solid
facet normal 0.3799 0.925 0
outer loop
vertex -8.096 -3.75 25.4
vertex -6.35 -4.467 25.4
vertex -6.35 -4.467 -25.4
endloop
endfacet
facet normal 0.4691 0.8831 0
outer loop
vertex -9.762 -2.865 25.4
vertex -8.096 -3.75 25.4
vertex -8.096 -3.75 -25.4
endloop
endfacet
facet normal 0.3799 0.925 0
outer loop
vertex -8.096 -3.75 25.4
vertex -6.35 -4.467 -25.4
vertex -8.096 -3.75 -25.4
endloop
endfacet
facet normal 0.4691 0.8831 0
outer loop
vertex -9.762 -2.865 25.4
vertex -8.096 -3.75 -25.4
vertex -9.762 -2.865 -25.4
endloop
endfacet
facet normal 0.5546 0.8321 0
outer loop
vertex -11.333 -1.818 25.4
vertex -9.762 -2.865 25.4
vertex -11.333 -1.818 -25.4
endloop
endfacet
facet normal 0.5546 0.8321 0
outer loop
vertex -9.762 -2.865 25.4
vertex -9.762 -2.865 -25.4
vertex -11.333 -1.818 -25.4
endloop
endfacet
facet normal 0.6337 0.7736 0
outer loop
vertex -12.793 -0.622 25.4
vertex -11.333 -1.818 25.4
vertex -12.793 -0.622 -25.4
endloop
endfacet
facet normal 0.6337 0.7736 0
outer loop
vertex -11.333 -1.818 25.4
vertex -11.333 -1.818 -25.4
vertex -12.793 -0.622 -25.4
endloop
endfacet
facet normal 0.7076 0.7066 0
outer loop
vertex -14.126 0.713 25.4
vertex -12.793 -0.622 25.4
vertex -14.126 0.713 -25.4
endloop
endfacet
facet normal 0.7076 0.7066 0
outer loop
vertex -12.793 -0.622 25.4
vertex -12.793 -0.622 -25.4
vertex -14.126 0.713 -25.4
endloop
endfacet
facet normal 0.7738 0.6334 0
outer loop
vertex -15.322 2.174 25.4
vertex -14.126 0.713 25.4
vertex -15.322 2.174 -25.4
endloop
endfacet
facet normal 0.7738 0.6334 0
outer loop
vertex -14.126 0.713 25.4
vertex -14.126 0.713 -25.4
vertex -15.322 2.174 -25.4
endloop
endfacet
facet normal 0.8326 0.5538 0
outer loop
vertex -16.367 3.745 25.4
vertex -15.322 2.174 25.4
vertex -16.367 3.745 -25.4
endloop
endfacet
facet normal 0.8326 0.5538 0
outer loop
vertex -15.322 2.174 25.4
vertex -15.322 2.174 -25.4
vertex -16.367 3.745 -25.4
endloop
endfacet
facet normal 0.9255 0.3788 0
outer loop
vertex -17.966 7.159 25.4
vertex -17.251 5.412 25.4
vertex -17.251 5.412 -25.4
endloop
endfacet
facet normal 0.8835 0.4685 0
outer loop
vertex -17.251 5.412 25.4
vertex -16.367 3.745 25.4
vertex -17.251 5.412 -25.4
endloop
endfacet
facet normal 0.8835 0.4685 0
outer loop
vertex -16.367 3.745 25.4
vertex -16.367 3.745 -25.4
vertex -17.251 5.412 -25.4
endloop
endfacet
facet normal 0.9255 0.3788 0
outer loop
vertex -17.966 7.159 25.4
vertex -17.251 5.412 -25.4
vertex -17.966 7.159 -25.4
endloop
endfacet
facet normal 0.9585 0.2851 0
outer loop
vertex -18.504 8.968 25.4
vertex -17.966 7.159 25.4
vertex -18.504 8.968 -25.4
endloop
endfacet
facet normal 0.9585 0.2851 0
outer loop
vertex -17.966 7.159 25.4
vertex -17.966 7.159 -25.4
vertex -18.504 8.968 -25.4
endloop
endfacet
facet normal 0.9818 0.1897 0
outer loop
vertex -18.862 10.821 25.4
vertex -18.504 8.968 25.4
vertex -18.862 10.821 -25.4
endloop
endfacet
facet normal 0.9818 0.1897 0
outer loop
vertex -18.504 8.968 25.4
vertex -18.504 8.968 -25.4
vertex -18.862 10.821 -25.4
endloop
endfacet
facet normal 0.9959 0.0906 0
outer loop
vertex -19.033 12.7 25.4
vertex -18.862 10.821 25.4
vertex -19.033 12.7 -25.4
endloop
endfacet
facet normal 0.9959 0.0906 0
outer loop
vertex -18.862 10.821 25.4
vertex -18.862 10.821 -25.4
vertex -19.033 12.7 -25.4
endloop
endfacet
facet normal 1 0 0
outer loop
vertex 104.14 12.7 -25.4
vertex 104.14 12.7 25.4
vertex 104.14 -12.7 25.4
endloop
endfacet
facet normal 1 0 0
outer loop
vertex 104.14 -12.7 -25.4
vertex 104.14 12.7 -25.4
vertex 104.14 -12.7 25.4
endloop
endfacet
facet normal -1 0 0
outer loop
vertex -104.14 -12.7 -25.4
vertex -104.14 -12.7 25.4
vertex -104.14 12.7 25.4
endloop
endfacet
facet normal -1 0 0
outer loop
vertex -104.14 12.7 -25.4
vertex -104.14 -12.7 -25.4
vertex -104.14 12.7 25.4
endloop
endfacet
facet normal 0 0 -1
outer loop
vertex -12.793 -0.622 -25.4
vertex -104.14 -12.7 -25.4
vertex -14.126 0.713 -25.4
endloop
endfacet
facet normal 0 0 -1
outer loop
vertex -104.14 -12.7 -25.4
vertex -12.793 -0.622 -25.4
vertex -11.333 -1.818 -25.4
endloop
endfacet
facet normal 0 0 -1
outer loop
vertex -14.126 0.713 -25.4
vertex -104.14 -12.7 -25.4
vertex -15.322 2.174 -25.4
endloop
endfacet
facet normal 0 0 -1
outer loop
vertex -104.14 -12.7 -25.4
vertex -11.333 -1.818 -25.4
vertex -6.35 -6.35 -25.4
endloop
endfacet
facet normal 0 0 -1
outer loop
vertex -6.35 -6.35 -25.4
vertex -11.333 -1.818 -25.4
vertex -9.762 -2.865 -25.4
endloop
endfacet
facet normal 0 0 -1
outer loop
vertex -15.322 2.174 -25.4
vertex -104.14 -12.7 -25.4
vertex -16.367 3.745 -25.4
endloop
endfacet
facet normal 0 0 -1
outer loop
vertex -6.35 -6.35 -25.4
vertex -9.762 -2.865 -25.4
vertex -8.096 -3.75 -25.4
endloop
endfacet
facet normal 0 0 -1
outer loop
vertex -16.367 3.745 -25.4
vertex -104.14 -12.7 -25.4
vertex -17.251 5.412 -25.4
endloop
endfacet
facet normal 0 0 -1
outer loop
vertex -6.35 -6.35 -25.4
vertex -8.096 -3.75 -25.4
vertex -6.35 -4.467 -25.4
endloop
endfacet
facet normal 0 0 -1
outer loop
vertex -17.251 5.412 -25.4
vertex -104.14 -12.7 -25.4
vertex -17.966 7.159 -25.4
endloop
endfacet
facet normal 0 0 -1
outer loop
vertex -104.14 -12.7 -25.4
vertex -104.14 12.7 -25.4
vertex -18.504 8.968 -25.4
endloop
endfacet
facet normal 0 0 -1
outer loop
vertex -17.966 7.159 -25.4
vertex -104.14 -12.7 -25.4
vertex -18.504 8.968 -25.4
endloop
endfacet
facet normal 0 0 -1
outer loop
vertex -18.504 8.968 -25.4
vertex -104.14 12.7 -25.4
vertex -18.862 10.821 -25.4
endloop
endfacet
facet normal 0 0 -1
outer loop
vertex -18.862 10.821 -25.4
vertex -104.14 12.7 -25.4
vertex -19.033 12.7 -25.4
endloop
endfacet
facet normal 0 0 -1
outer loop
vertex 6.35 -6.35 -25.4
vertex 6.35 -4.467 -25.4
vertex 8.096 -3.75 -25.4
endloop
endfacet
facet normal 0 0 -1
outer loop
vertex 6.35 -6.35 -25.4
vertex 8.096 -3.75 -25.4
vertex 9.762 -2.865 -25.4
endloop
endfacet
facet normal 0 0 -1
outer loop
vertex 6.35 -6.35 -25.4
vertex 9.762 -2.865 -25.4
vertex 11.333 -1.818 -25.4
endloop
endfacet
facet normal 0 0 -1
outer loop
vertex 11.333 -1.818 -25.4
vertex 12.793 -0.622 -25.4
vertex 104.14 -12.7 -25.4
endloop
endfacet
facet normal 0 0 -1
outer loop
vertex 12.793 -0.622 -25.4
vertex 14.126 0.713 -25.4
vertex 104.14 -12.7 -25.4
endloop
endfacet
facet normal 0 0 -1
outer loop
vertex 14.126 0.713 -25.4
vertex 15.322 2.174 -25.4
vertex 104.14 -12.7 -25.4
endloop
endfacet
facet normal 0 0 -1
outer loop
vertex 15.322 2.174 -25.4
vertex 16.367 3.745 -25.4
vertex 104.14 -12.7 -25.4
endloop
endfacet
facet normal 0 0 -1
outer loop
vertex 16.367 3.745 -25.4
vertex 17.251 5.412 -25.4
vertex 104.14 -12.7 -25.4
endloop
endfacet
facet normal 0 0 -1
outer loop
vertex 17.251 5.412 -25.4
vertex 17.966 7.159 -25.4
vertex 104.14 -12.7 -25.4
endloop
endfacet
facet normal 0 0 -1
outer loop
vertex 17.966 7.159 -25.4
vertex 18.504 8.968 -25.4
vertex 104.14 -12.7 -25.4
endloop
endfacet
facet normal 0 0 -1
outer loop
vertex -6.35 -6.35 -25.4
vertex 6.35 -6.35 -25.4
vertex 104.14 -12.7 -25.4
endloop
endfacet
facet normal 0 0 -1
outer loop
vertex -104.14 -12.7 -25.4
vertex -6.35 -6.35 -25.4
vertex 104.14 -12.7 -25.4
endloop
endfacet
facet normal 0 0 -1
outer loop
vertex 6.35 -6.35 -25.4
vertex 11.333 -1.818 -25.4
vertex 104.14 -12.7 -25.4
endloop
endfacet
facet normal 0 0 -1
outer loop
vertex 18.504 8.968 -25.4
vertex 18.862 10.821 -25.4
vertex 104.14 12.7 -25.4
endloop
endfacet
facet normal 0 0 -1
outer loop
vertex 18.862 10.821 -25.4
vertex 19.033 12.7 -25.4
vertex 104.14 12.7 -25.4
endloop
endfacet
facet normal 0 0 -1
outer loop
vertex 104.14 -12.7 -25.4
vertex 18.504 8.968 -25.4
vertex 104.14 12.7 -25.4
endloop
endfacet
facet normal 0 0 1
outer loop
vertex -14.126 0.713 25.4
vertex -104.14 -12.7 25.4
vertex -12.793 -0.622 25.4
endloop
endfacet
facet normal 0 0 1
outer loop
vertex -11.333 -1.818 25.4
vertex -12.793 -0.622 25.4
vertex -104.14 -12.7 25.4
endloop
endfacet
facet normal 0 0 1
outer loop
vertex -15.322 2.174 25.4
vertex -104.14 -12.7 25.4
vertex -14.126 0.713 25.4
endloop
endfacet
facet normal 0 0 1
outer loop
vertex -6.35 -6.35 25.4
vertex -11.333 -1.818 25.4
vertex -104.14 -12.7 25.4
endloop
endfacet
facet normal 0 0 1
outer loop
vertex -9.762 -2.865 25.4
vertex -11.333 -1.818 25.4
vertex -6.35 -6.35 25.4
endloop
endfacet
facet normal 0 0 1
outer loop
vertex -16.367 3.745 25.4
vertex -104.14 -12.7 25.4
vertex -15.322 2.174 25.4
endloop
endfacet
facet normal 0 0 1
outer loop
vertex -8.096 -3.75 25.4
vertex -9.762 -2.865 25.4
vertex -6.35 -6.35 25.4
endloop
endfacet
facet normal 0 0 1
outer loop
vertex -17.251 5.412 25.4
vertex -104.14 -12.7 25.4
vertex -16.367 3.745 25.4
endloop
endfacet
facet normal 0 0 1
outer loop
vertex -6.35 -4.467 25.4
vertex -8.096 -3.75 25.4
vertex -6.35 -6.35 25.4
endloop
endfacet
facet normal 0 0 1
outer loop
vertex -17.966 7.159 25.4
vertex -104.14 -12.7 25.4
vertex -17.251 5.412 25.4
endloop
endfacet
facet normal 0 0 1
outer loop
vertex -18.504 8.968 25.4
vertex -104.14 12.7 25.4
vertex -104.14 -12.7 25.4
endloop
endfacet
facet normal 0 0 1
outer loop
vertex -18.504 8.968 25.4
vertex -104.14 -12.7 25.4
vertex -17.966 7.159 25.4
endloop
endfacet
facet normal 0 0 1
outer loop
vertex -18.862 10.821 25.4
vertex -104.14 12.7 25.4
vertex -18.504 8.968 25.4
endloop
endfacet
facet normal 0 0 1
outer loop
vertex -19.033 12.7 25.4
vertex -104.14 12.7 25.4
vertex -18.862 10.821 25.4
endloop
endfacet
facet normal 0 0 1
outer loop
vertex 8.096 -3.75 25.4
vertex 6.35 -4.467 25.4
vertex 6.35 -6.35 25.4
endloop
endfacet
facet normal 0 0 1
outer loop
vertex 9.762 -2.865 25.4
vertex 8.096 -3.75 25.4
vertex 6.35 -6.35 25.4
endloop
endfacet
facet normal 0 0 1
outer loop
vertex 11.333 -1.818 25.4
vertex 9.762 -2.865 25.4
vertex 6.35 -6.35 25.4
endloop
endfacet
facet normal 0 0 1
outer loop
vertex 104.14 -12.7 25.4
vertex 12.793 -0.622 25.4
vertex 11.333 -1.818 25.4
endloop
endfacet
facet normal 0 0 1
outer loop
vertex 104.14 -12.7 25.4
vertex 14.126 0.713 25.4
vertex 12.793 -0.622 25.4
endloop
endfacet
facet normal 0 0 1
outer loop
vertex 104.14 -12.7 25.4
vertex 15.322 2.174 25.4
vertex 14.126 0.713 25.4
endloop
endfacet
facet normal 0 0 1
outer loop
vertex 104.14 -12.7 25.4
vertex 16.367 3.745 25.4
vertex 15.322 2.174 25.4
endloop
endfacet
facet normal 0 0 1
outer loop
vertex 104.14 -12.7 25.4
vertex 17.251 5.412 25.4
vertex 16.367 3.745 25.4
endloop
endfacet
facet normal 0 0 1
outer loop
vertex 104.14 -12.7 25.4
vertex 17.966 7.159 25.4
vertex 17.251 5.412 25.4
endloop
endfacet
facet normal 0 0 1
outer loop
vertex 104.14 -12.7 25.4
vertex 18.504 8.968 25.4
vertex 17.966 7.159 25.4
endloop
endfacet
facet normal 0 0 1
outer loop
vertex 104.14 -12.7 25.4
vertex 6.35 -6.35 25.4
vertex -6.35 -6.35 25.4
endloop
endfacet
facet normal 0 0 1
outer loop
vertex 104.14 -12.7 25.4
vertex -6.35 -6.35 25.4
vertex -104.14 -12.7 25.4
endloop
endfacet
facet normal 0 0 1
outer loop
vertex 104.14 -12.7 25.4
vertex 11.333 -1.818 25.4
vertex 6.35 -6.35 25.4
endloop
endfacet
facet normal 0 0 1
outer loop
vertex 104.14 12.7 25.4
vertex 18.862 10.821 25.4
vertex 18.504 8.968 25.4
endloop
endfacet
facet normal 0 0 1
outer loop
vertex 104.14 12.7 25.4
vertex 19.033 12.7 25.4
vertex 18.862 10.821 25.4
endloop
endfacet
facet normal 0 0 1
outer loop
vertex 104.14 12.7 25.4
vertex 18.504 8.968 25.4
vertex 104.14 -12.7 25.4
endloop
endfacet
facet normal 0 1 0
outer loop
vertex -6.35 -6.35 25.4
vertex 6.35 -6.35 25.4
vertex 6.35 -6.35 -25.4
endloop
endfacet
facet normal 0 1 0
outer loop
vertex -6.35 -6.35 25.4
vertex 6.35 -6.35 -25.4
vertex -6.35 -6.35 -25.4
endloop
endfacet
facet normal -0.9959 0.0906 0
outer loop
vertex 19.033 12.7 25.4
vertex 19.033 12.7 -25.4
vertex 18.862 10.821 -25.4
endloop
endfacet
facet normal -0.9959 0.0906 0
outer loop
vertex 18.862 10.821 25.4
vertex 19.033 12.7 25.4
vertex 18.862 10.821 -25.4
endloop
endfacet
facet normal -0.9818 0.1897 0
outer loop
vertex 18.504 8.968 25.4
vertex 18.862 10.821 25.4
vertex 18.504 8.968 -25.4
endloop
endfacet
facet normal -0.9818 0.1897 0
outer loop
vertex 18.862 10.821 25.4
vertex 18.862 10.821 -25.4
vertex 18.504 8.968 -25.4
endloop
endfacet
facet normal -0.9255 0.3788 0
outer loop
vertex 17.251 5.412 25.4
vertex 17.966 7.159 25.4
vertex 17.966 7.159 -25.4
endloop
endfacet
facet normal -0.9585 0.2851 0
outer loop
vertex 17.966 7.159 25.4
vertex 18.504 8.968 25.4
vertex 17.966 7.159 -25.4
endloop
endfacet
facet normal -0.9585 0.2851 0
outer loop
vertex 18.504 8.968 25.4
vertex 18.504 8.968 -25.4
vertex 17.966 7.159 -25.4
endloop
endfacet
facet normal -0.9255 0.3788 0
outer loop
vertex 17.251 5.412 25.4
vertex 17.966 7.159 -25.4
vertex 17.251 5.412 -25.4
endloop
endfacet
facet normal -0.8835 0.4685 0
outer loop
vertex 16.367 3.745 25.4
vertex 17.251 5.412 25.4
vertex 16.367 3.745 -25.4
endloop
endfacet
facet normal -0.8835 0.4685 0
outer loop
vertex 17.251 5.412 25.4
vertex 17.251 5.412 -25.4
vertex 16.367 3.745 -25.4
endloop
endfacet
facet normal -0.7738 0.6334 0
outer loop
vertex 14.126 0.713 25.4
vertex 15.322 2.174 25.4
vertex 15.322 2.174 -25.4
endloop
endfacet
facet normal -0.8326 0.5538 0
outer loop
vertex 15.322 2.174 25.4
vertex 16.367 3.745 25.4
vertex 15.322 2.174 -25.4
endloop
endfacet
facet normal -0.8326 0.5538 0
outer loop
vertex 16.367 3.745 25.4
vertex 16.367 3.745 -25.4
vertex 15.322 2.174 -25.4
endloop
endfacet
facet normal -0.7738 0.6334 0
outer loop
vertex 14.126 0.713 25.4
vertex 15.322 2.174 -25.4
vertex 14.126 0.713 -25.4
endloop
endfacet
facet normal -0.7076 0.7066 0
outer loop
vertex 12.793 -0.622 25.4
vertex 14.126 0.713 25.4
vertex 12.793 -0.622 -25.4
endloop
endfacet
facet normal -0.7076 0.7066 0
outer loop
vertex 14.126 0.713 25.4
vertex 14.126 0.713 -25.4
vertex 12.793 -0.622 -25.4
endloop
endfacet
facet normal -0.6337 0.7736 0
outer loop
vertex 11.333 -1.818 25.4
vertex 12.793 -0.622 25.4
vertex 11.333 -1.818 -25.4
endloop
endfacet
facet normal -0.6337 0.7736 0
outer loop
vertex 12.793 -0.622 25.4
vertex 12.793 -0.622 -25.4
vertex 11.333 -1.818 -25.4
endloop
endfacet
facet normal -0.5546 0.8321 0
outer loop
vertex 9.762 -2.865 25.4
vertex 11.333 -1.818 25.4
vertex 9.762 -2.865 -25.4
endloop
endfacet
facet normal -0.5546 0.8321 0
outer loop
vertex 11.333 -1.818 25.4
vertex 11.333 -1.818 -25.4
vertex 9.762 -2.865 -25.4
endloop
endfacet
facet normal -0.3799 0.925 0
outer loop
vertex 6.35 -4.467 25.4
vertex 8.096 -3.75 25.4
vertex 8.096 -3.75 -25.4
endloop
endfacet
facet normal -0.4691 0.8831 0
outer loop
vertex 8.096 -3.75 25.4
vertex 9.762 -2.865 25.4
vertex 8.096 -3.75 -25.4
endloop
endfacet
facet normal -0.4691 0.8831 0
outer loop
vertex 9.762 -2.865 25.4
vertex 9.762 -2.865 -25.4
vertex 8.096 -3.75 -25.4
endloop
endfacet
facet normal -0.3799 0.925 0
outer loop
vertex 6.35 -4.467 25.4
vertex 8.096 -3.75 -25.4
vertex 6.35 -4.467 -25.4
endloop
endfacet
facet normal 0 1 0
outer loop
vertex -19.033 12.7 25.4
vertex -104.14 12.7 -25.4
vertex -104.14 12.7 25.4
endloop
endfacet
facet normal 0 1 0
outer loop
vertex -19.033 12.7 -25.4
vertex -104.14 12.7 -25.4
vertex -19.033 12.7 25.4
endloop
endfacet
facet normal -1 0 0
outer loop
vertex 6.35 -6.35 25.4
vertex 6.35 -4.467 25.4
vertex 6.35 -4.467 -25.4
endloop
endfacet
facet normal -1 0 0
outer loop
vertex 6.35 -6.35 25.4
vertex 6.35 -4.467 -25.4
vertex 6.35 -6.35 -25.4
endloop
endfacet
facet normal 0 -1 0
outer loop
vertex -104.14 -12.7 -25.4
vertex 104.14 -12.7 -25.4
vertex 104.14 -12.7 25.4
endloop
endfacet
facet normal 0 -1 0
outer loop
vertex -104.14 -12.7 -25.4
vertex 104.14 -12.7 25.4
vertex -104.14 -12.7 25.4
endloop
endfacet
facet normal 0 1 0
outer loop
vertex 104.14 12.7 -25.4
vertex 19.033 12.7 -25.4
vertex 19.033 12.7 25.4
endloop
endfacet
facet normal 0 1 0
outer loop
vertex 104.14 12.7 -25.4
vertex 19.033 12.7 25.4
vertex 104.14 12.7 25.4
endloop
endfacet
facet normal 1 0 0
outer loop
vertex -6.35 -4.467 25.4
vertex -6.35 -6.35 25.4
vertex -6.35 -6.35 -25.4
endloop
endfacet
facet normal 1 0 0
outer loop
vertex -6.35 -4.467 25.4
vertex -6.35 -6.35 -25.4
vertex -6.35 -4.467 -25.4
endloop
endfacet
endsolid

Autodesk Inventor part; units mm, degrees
ref_plane "YZ Plane" through (0, 0, 0) normal (1, 0, 0) x (0, 1, 0)
ref_plane "XZ Plane" through (0, 0, 0) normal (0, 1, 0) x (-1, 0, 0)
ref_plane "XY Plane" through (0, 0, 0) normal (0, 0, 1) x (1, 0, 0)
sketch "Sketch1" plane through (0, 0, 0) normal (0, 0, 1) x (1, 0, 0)
  line L0 (-104.14, 12.7) -> (104.14, 12.7)
  line L1 (104.14, 12.7) -> (104.14, -12.7)
  line L2 (104.14, -12.7) -> (-104.14, -12.7)
  line L3 (-104.14, -12.7) -> (-104.14, 12.7)
  line L4 (-104.14, 12.7) -> (104.14, -12.7) construction
  line L5 (104.14, 12.7) -> (-104.14, -12.7) construction
  point P0 (0, 0)
  dimension "d0" = 208.28
  dimension "d1" = 25.4
extrude "Extrusion1" add sketch "Sketch1" along normal mid plane 50.8
sketch "Sketch2" plane through (0, 0, 25.4) normal (0, 0, 1) x (1, 0, 0)
  line L0 (-104.14, 12.7) -> (-104.14, -12.7) projected
  line L1 (-104.14, -12.7) -> (104.14, -12.7) projected
  point P0 (0, 0)
  point P1 (0, 13.4938)
  dimension "d5" = 104.14
  dimension "d13" = 26.1938
hole "Hole1" at (0, 13.4938, 25.4) direction (0, 0, -1) diameter 38.1 end through all
sketch "Sketch3" plane through (0, 0, 25.4) normal (0, 0, 1) x (1, 0, 0)
  line L0 (-6.35, 12.7) -> (6.35, 12.7)
  line L1 (6.35, 12.7) -> (6.35, -6.35)
  line L2 (6.35, -6.35) -> (-6.35, -6.35)
  line L3 (-6.35, -6.35) -> (-6.35, 12.7)
  line L4 (104.14, 12.7) -> (19.0335, 12.7) projected
  line L5 (-104.14, 12.7) -> (-104.14, -12.7) projected
  point P0 (0, 0)
  dimension "d14" = 19.05
  dimension "d15" = 19.05
  dimension "d16" = 12.7
  dimension "d17" = 97.79
extrude "Extrusion2" cut sketch "Sketch3" against normal through all
equation "\"d0\" = kn_wid"
equation "\"d1\" = kn_hei"
equation "\"d2\" = kn_len"
equation "\"d5\" = 0.5 * kn_wid"
equation "\"d13\" = kn_hei + kn_hole_offset"
equation "\"d6\" = kn_hole_diam"
equation "\"d14\" = kn_groove_hei"
equation "\"d15\" = kn_groove_hei"
equation "\"d16\" = kn_groove_wid"
equation "\"d17\" = 0.5 * kn_wid - 0.5 * kn_groove_wid"
equation "\"kn_wid\" = 208.28"
equation "\"kn_hei\" = 25.4"
equation "\"kn_len\" = 50.8"
equation "\"kn_hole_diam\" = 38.1"
equation "\"kn_groove_hei\" = 19.05"
equation "\"kn_groove_wid\" = 12.7"
equation "\"kn_hole_offset\" = 0.79375"
properties part number "kfnmount" material "Aluminum 6061"
